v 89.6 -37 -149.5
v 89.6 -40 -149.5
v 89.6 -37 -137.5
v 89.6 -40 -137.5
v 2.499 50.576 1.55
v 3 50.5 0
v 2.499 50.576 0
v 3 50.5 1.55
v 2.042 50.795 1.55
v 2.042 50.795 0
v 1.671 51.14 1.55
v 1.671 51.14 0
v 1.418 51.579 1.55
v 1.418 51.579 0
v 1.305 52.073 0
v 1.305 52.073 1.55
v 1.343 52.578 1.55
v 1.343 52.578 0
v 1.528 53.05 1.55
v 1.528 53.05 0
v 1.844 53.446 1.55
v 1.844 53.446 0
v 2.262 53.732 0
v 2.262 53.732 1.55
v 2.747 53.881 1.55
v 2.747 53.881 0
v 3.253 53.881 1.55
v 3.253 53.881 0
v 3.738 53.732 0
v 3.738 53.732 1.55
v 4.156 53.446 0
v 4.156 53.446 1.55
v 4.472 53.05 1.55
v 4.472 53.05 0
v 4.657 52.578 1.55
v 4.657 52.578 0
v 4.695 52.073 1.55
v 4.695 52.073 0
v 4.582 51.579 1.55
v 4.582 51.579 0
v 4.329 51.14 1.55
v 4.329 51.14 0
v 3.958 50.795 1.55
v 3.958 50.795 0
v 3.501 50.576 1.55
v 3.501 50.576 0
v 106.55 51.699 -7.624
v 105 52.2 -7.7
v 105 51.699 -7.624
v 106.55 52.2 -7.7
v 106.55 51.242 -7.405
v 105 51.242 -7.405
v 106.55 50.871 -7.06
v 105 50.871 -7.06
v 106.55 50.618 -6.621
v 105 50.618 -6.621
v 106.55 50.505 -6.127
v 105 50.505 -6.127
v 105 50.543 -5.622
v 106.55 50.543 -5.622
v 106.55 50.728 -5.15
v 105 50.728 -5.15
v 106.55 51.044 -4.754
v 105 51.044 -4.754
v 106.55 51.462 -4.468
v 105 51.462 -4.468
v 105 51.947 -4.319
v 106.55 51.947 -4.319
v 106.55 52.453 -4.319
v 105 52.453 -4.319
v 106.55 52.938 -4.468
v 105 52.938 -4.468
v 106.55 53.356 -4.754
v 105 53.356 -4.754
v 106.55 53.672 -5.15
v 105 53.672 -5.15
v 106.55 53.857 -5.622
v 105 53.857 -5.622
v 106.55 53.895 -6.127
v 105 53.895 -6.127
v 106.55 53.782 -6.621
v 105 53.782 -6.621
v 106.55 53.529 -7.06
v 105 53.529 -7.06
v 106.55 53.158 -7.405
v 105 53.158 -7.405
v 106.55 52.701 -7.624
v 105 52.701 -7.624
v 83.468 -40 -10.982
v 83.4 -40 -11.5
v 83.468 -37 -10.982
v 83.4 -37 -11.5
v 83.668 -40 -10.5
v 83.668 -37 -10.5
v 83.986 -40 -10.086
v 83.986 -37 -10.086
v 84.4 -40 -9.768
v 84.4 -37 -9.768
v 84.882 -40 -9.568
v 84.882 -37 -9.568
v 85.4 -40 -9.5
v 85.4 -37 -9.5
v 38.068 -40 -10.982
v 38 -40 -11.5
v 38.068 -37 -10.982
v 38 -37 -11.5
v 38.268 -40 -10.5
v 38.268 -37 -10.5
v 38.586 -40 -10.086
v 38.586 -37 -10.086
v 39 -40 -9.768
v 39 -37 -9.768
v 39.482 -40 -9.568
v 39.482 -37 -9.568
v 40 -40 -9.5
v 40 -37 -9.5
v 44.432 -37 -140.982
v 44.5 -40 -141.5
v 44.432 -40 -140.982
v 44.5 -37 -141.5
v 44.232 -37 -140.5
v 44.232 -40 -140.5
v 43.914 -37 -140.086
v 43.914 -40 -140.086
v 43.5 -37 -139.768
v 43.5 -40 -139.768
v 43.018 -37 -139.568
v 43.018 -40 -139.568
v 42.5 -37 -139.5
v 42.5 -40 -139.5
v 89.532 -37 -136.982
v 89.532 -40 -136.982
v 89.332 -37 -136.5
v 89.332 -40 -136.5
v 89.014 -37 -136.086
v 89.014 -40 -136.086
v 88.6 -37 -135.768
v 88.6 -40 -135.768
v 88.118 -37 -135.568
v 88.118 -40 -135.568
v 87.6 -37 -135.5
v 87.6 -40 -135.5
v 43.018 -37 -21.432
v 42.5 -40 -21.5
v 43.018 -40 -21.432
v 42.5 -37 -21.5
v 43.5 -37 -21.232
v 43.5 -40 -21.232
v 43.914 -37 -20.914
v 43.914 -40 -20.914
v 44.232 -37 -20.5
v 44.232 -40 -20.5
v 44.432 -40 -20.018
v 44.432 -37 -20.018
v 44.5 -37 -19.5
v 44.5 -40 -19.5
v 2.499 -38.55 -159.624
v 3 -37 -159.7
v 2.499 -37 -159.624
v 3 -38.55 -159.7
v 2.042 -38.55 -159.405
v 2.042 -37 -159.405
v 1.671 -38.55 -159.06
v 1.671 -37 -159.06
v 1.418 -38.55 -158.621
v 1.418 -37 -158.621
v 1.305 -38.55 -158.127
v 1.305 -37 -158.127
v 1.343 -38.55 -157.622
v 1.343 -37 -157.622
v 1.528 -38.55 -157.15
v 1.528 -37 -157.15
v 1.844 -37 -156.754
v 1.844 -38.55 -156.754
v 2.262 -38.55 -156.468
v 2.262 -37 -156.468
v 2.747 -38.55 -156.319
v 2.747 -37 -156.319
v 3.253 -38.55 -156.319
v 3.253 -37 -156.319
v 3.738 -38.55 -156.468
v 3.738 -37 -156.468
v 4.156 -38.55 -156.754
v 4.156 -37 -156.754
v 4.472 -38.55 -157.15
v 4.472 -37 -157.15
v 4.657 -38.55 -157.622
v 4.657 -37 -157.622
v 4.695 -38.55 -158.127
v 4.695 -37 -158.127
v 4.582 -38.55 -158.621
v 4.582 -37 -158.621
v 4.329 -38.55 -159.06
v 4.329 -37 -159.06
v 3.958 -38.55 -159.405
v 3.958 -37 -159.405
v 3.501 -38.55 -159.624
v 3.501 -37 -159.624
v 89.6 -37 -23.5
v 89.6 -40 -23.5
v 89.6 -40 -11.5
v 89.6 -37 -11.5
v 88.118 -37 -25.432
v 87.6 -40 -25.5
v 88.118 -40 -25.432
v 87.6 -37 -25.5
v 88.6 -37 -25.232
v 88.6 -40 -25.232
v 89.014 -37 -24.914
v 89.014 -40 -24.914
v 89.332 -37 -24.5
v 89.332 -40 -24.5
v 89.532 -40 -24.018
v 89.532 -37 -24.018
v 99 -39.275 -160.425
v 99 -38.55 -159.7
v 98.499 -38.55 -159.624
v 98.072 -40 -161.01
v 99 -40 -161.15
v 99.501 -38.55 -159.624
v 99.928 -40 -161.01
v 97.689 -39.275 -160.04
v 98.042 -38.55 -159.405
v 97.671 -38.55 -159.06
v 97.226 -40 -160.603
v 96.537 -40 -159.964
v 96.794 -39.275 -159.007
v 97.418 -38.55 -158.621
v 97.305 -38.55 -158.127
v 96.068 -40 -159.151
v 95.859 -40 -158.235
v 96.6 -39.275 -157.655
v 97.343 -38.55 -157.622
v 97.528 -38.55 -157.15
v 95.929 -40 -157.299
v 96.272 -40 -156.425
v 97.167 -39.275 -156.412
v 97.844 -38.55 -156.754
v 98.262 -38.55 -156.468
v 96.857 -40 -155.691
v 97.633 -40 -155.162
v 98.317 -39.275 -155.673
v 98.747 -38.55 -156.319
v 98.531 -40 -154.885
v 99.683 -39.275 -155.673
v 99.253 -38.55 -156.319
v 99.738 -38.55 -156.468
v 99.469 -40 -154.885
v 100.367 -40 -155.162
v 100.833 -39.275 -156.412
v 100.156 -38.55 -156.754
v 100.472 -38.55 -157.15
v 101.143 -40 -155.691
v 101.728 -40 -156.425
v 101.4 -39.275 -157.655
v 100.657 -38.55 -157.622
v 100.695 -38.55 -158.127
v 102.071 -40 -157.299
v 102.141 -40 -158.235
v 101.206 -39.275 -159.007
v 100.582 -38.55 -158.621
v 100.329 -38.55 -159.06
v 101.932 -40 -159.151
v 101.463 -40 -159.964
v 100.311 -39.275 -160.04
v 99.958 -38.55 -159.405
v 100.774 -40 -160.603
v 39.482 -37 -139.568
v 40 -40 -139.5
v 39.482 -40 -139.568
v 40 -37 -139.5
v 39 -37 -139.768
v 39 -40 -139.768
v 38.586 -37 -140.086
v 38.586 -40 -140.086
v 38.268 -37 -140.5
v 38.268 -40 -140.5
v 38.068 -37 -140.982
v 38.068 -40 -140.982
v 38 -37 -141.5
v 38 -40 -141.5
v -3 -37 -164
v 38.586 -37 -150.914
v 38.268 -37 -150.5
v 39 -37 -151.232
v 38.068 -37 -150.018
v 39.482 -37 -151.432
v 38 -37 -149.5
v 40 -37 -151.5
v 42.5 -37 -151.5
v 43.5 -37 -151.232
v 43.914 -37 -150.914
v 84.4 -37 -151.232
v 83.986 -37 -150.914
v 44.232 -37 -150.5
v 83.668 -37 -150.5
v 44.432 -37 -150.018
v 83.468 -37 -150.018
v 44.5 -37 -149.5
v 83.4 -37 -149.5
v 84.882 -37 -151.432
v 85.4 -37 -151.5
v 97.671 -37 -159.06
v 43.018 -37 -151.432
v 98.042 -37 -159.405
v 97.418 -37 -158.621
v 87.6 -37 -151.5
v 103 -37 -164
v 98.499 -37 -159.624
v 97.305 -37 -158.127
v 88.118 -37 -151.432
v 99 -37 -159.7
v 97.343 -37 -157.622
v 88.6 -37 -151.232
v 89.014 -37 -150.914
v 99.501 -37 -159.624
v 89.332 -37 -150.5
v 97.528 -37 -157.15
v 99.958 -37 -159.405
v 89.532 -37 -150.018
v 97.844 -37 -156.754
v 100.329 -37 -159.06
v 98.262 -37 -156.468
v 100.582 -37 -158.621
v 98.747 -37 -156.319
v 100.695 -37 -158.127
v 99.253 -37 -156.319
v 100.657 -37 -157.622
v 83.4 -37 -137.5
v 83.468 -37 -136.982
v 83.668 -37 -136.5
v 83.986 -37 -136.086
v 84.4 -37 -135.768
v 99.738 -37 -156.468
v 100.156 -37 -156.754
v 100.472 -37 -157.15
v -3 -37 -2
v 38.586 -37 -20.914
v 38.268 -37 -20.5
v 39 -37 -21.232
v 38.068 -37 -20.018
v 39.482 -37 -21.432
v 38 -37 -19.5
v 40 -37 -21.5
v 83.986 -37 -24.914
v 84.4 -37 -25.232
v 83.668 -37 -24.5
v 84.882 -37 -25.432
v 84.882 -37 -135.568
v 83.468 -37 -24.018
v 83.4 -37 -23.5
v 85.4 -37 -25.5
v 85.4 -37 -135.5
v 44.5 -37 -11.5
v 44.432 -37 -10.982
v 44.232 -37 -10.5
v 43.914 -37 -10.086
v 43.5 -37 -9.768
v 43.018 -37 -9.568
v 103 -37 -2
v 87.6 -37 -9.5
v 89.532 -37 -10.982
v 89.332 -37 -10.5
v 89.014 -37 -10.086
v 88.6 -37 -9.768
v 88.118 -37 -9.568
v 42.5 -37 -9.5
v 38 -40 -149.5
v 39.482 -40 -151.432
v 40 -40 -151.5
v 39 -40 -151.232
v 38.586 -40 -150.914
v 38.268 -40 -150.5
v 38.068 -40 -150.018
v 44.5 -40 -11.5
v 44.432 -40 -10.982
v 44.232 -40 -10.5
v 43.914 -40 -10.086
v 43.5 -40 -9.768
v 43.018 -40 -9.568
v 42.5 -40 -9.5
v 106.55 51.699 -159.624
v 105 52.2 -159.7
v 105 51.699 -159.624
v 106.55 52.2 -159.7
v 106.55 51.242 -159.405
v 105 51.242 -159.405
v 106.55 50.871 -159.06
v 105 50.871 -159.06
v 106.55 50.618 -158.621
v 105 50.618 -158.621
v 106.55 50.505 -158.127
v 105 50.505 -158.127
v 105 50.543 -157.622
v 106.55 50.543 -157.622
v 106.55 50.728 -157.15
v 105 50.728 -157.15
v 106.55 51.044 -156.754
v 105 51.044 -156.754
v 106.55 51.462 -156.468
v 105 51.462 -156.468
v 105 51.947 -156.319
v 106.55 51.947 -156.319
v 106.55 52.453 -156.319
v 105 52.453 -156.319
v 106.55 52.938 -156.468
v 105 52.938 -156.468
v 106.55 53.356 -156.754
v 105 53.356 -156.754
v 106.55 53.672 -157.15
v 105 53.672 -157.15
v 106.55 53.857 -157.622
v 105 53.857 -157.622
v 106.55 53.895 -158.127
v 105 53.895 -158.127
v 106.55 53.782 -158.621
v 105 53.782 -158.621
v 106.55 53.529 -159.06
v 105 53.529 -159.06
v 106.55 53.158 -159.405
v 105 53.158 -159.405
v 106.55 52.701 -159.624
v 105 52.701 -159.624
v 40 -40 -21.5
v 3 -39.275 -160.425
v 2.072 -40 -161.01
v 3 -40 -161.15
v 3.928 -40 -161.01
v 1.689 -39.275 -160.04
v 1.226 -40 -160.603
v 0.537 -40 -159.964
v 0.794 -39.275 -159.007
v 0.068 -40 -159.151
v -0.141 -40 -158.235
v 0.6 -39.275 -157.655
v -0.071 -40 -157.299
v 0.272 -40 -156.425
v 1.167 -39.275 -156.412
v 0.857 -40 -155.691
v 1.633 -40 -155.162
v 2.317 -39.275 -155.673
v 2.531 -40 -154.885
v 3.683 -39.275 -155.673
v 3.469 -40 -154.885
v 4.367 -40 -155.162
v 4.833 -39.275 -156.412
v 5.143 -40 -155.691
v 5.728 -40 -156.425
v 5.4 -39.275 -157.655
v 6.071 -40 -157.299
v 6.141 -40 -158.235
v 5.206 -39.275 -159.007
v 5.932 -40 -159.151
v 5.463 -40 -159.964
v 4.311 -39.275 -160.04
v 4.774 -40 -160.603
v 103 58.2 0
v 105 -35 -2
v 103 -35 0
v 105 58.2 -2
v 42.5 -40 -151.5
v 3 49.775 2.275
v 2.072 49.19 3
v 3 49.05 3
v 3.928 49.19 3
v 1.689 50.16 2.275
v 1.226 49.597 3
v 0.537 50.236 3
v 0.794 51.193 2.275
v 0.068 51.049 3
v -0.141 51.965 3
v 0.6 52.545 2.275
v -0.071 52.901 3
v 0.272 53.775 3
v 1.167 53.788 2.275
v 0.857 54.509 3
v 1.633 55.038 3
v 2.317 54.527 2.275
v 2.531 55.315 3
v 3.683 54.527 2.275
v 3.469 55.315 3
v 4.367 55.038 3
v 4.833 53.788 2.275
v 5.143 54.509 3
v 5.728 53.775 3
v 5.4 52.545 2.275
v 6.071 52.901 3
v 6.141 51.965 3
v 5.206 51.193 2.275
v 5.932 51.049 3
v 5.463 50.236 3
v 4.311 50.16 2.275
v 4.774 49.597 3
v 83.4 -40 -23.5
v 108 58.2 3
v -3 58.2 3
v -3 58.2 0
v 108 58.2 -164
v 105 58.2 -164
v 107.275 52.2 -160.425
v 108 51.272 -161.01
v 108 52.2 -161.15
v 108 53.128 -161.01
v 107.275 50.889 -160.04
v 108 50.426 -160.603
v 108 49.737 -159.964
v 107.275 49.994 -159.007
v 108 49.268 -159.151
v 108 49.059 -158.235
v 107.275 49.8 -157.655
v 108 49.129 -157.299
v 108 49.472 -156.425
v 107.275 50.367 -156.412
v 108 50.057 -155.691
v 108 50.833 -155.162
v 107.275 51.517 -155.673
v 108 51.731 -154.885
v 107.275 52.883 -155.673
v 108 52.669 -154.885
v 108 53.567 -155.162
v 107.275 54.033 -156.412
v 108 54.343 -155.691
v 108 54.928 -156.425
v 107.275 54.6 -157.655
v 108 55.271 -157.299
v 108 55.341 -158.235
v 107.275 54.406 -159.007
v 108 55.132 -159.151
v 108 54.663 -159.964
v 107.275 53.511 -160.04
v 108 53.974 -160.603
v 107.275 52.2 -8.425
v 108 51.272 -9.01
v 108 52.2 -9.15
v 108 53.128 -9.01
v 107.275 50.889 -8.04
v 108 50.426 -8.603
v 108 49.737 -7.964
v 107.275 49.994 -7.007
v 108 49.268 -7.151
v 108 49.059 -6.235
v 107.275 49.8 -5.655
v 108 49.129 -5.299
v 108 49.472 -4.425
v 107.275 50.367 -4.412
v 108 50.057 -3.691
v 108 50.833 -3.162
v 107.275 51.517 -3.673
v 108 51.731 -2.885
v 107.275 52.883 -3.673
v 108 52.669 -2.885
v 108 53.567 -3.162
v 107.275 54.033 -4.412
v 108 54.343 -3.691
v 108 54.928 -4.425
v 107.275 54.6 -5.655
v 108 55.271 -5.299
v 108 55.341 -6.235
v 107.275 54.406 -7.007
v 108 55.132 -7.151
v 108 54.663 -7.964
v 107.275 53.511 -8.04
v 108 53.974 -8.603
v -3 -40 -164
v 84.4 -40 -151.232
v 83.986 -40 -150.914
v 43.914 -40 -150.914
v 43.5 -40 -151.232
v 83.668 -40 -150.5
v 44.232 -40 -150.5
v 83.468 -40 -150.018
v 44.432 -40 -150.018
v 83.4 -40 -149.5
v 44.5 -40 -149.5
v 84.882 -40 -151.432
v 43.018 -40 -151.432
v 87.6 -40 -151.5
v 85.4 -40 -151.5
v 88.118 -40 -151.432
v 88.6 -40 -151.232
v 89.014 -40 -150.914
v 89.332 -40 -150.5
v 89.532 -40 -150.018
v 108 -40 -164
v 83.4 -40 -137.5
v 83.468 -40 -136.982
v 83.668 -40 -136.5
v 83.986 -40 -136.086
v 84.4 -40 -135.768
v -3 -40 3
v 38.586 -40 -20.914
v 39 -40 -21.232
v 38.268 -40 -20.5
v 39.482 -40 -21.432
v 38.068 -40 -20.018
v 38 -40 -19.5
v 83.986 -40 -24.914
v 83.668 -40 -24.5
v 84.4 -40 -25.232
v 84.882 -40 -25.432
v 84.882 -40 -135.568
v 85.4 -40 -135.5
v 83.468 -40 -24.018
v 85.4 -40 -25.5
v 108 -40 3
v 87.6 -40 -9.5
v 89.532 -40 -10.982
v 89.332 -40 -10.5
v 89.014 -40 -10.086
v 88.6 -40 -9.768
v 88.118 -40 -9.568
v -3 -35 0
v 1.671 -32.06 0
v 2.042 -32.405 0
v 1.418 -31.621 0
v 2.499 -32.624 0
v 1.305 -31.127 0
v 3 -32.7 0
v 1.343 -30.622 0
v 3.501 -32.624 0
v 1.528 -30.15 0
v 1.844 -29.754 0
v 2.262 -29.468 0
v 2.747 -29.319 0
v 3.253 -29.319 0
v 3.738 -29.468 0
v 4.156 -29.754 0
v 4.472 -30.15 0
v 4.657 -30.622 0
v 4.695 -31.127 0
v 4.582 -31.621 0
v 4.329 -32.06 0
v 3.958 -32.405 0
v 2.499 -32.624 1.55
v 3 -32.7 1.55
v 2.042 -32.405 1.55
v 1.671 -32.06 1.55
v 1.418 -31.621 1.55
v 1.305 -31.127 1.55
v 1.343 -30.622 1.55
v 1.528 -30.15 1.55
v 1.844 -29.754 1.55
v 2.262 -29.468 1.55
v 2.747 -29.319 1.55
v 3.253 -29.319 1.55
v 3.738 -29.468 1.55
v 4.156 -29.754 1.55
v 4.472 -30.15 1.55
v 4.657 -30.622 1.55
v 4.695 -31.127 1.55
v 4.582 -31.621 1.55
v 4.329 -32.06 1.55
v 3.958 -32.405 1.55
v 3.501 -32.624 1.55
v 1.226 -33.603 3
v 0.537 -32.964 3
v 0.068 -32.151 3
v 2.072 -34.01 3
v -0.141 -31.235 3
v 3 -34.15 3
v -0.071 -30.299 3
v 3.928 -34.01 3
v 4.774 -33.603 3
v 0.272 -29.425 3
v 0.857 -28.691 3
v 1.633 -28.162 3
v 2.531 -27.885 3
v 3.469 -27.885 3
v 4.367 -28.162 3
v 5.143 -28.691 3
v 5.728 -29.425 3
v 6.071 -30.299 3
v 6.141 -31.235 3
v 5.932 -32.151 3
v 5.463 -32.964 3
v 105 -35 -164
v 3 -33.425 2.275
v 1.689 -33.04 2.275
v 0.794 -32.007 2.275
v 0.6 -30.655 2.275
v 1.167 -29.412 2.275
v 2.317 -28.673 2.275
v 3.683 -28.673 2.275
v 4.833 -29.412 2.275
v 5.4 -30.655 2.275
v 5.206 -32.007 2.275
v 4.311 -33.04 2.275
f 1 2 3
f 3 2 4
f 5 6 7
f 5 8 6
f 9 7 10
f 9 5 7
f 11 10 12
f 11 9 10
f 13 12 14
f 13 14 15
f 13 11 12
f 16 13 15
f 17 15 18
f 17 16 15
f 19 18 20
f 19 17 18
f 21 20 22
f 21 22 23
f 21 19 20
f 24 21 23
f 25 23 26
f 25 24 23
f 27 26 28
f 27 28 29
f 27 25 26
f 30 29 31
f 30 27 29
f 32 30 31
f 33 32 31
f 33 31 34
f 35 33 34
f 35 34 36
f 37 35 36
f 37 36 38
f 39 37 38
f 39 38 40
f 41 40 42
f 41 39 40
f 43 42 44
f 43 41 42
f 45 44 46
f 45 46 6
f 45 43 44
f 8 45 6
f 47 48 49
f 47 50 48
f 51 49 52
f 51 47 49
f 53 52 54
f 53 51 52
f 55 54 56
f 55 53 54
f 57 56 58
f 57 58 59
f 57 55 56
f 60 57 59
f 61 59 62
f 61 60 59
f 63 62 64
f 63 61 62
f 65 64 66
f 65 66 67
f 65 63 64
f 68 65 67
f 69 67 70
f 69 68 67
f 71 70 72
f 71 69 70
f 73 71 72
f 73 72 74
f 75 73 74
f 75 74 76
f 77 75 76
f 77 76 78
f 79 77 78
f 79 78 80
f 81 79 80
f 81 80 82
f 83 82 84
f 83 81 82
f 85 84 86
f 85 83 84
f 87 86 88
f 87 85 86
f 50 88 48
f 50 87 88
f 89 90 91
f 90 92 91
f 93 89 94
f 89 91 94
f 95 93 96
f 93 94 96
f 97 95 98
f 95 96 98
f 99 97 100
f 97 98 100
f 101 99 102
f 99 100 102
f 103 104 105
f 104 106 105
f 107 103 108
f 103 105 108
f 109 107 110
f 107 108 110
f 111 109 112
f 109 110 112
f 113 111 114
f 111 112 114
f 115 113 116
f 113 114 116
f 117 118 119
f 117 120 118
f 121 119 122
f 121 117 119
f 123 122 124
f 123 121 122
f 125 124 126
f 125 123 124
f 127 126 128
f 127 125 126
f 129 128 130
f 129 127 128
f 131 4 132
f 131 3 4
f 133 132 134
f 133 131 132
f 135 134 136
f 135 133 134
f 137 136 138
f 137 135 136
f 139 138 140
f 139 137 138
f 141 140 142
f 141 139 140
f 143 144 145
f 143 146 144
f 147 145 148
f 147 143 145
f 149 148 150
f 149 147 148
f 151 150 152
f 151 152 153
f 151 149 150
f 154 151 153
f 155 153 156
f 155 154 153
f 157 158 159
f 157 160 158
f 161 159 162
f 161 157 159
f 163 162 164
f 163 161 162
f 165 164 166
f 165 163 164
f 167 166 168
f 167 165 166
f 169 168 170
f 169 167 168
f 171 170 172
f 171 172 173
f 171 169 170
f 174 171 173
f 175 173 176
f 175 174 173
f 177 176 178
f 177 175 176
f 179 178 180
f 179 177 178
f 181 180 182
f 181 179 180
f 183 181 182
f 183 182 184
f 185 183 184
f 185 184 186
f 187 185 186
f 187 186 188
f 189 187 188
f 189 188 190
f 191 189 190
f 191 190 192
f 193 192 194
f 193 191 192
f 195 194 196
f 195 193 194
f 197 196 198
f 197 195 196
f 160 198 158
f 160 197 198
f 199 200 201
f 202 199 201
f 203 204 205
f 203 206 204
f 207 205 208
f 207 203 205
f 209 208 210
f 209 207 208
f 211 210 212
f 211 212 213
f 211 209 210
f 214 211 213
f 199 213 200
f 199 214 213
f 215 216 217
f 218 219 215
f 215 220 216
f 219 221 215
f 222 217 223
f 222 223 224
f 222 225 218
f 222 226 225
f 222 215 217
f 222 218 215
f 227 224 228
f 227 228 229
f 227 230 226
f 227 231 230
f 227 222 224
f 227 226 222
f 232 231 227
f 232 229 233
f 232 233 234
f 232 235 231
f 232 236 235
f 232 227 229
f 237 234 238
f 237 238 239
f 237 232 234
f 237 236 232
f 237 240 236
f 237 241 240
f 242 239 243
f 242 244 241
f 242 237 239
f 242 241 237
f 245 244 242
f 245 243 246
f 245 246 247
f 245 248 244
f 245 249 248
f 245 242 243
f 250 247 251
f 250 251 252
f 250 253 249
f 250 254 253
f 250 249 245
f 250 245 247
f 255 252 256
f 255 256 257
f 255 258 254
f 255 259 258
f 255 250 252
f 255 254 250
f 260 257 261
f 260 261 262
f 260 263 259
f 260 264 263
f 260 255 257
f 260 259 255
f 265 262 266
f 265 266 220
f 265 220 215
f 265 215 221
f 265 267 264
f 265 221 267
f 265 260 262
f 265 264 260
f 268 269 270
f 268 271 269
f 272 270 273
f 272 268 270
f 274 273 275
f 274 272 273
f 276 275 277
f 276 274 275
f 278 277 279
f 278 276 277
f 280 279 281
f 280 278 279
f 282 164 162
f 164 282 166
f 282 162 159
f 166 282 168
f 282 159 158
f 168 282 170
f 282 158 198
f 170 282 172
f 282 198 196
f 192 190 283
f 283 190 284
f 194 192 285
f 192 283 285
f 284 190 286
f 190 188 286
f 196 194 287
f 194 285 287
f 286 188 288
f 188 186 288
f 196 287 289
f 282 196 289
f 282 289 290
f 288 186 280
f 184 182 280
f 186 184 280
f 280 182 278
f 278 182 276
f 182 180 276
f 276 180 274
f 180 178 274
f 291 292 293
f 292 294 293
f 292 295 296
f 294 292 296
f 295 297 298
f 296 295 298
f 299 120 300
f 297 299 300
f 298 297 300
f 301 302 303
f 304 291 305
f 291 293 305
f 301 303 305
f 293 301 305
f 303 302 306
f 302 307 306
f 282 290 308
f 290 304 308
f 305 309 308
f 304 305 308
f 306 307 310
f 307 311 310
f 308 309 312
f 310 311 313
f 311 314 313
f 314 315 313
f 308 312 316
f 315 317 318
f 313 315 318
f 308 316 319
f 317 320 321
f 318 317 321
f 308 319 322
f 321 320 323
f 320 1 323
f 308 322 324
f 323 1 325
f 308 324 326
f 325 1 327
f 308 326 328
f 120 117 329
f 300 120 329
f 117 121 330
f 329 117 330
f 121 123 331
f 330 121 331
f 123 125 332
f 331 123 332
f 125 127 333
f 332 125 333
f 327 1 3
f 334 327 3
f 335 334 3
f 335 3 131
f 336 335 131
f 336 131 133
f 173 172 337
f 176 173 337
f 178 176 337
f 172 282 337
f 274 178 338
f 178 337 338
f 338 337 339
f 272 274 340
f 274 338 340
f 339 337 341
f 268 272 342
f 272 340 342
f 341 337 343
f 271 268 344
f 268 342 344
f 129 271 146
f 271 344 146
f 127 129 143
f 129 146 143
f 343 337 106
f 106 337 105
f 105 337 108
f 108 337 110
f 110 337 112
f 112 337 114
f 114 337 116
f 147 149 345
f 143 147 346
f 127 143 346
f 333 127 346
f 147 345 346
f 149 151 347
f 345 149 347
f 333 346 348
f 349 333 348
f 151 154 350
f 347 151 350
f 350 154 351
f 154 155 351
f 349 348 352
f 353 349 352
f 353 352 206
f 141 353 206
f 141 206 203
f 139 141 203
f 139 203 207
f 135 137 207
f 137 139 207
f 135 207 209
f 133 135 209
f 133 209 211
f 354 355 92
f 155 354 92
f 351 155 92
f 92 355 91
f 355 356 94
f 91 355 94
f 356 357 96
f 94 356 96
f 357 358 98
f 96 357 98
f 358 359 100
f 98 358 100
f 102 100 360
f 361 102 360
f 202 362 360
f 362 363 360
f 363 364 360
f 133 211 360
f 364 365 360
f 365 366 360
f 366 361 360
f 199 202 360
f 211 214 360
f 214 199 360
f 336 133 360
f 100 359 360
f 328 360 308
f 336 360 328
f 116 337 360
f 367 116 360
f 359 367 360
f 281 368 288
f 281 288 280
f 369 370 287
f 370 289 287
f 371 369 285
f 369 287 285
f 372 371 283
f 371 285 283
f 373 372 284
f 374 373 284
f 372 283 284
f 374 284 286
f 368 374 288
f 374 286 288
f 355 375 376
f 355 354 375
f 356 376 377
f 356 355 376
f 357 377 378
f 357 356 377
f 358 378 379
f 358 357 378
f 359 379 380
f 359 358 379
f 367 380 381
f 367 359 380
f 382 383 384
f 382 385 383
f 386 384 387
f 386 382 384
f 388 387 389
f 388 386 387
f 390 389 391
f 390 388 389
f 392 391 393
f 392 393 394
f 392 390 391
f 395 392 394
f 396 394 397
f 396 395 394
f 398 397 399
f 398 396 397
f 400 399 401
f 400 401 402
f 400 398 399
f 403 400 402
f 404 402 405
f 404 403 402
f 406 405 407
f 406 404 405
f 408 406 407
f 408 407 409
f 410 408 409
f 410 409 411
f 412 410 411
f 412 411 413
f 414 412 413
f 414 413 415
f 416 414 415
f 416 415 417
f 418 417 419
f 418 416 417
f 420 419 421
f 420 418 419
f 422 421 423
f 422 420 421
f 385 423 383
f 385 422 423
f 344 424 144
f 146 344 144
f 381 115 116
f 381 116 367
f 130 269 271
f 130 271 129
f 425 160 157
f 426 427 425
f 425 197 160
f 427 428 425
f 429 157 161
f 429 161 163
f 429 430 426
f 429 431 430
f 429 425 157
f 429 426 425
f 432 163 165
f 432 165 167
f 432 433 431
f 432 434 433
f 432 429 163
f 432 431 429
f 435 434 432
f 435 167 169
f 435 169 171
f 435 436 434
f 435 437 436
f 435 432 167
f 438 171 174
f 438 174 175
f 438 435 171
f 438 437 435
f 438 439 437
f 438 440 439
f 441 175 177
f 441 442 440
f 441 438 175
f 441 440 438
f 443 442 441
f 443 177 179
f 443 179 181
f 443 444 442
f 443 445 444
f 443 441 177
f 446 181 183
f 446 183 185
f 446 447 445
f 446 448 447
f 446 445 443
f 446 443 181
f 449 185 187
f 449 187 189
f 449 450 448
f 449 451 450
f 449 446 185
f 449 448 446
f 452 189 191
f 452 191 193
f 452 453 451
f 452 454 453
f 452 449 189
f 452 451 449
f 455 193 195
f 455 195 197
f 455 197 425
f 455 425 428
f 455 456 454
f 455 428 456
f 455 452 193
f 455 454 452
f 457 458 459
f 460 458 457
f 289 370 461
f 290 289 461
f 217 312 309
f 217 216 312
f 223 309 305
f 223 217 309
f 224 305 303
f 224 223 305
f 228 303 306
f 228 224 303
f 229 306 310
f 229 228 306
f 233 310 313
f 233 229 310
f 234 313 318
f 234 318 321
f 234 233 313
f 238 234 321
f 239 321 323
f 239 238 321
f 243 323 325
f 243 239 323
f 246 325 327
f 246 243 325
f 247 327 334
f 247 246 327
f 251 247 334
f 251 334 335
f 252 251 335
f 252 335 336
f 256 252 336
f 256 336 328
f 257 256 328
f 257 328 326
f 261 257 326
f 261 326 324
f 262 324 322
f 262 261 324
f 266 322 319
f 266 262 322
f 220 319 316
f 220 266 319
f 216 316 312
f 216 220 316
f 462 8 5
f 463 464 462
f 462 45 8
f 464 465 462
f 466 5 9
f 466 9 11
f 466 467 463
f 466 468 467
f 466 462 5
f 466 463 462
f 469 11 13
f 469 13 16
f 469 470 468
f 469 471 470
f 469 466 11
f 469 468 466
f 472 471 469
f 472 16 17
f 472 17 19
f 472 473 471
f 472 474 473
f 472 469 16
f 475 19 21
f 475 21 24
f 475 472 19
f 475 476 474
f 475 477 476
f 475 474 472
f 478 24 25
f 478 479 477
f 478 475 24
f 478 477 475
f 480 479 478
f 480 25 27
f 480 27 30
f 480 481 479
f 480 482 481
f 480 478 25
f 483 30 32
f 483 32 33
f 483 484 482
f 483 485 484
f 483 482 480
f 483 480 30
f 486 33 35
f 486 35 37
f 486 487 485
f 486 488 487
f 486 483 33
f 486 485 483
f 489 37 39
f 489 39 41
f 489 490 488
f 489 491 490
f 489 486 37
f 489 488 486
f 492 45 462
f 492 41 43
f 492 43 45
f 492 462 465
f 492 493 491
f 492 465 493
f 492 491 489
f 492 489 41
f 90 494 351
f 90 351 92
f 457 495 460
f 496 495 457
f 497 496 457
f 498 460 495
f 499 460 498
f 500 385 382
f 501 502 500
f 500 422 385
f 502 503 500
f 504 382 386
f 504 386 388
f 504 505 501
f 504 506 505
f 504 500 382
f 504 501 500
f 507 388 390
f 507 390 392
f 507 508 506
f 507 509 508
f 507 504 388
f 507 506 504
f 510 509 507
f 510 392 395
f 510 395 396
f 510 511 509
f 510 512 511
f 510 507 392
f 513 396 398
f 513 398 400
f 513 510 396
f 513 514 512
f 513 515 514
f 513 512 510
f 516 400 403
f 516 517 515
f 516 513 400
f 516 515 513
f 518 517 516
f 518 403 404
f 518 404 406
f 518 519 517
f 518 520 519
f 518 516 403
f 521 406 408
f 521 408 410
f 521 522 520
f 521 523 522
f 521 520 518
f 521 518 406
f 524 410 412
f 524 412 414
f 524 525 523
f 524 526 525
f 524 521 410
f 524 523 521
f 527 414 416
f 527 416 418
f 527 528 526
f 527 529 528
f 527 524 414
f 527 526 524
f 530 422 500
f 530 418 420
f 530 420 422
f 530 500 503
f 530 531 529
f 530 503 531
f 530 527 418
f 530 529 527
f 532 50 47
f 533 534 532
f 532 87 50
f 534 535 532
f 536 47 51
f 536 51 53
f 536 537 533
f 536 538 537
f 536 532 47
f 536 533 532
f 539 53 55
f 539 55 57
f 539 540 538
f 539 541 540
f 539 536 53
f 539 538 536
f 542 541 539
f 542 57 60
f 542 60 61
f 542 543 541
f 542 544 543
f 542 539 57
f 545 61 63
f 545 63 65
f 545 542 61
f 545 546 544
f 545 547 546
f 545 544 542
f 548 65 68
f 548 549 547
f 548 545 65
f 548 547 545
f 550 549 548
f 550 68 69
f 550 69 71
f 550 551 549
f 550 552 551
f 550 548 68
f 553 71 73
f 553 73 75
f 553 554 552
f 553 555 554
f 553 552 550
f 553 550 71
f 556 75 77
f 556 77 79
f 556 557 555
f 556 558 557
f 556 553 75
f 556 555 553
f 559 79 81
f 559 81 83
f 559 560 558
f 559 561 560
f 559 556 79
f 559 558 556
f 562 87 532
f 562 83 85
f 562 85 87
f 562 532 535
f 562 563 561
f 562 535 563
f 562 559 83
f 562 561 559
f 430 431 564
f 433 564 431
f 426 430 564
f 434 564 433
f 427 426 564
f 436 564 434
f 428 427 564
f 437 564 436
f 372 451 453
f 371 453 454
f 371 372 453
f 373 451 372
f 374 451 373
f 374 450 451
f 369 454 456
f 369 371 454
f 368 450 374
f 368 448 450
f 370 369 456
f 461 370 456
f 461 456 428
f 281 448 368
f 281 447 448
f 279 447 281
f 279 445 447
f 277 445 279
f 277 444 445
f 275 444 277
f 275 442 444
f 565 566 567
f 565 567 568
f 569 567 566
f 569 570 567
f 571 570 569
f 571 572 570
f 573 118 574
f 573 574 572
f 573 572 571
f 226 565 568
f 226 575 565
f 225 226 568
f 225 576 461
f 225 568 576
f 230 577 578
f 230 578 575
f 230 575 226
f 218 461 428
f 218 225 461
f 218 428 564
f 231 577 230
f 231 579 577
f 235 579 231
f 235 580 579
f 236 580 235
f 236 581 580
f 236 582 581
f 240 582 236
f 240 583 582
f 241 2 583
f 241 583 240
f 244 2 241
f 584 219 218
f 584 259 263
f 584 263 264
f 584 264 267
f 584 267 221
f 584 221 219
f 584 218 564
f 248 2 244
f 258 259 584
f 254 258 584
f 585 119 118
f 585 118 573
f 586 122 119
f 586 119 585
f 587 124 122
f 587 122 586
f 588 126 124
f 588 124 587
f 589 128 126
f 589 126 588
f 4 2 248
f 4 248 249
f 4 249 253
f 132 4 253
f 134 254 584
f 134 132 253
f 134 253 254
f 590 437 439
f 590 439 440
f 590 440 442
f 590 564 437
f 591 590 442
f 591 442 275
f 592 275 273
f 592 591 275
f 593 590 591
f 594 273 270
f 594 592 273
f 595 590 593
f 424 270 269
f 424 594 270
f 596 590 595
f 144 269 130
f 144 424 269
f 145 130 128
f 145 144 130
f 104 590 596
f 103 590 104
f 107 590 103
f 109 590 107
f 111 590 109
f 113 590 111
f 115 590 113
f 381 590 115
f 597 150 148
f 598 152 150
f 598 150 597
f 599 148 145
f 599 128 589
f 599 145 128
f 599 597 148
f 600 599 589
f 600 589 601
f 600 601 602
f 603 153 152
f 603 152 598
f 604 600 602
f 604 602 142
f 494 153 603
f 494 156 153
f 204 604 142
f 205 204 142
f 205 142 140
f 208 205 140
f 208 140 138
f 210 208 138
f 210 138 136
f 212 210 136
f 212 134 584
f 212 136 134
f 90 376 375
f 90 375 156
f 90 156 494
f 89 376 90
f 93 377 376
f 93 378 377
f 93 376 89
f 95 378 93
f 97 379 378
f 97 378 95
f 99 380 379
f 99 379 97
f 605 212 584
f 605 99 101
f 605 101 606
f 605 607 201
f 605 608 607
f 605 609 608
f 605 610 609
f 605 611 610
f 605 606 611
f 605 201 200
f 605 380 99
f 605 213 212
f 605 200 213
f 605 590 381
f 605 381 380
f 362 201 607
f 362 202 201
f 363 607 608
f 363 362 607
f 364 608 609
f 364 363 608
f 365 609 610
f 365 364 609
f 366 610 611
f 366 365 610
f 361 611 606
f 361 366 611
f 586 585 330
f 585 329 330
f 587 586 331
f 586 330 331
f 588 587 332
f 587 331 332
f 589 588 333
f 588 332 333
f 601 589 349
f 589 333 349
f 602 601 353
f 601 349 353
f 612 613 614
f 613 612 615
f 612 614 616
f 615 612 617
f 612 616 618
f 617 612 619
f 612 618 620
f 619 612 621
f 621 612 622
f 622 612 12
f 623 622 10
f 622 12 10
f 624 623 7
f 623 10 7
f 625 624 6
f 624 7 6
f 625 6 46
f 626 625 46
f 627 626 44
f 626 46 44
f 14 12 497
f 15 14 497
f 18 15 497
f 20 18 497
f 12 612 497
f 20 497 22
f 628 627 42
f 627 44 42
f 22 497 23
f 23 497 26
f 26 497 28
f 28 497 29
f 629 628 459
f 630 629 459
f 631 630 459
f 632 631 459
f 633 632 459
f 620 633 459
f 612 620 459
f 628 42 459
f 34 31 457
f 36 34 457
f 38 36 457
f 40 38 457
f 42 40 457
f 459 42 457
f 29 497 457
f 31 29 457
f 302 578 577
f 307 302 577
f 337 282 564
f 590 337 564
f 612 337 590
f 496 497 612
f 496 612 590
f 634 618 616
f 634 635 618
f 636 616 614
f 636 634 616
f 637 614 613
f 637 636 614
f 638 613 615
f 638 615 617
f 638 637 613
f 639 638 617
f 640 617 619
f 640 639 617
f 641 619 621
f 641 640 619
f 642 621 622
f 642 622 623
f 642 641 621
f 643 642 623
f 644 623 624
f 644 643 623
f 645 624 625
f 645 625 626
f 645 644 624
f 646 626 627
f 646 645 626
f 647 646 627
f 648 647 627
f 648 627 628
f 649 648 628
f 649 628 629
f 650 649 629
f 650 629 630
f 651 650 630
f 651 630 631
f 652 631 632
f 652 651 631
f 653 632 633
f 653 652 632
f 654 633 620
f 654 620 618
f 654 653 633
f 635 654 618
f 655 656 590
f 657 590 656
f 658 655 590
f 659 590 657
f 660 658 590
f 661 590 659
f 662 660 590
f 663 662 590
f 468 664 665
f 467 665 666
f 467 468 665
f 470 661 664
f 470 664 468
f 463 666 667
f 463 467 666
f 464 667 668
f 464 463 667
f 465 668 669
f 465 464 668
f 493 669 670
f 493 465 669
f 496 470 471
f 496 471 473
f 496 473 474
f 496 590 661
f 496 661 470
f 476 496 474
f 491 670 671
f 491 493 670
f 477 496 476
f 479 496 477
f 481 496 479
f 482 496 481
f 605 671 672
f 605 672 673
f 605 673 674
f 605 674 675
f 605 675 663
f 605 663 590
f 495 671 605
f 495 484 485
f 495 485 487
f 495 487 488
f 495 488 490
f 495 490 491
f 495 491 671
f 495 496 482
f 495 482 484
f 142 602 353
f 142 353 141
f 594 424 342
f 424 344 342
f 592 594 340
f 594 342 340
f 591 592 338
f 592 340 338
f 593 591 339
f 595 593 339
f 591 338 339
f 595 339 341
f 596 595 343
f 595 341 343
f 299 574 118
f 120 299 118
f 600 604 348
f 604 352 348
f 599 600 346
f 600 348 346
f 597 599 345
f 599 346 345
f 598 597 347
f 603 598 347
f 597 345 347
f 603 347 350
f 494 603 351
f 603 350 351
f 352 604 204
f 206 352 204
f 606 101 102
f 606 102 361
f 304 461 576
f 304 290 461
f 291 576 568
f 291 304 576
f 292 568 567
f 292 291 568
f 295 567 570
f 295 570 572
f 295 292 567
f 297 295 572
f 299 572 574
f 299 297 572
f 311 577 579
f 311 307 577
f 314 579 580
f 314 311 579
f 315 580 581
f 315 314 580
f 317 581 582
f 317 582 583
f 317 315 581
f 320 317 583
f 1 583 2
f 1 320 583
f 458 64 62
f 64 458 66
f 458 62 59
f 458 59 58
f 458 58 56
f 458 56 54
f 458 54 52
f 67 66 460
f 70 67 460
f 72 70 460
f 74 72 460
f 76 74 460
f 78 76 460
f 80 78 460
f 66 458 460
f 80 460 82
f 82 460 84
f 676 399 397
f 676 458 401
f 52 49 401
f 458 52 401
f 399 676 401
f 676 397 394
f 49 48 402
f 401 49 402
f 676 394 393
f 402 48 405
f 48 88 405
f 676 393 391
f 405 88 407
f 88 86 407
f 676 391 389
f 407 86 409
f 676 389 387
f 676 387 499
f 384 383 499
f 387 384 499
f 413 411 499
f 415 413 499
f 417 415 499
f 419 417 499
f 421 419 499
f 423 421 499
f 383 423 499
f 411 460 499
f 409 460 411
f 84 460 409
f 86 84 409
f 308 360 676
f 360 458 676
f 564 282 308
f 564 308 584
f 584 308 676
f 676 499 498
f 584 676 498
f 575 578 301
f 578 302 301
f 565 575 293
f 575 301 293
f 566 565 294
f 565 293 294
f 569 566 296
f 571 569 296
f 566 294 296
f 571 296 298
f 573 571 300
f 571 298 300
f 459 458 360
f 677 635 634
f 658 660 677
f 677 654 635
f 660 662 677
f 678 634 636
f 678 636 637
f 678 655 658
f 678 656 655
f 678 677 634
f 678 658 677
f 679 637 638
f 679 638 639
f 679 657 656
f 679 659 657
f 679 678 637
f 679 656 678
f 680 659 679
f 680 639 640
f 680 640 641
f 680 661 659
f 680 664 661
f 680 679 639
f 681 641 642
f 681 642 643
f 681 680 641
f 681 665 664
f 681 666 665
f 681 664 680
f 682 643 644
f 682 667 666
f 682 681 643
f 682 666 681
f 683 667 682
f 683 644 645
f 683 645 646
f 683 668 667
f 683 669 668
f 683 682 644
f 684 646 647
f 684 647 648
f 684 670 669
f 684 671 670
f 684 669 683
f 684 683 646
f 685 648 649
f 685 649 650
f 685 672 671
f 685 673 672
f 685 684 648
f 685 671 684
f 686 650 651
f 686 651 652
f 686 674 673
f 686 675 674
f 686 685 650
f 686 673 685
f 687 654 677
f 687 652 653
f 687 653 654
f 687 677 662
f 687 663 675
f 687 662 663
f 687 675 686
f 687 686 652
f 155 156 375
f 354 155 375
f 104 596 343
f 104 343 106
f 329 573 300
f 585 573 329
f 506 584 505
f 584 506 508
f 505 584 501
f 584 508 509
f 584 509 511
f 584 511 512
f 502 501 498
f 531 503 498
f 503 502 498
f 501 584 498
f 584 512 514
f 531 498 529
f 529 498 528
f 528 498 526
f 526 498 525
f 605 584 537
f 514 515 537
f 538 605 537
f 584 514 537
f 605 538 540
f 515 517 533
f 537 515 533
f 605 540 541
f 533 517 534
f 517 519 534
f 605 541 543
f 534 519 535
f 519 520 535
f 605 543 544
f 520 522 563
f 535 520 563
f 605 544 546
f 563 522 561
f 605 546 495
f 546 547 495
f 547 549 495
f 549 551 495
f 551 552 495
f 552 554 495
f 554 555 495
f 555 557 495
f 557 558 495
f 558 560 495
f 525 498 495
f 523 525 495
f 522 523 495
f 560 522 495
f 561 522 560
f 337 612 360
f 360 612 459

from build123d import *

# Parameters (mm, degrees)
SKETCH2_W                                      = 108
SKETCH2_H                                      = 95.2
BOSS_EXTRUDE1_DEPTH                            = 3
SKETCH3_W                                      = 167
SKETCH3_H                                      = 95.2
BOSS_EXTRUDE2_DEPTH                            = 3
SKETCH4_W                                      = 111
SKETCH4_H                                      = 167
BOSS_EXTRUDE3_DEPTH                            = 3
CSK_FOR_M3_FLAT_HEAD_MACHINE_SCREW1_AT_2_COUNT = 2
CSK_FOR_M3_FLAT_HEAD_MACHINE_SCREW1_AT_2_PITCH = 83.2
CSK_FOR_M3_FLAT_HEAD_MACHINE_SCREW2_AT_2_COUNT = 2
CSK_FOR_M3_FLAT_HEAD_MACHINE_SCREW2_AT_2_PITCH = 96
CSK_FOR_M3_FLAT_HEAD_MACHINE_SCREW3_AT_2_COUNT = 2
CSK_FOR_M3_FLAT_HEAD_MACHINE_SCREW3_AT_2_PITCH = 152
CUT_EXTRUDE1_REACH                             = 221.552
SKETCH12_W                                     = 6.5
SKETCH12_H                                     = 12
SKETCH12_W_2                                   = 6.2
SKETCH12_H_2                                   = 16
FILLET1_R                                      = 2
CHAMFER1_SIZE                                  = 2


with BuildPart() as part:
    # Sketch2 → Boss-Extrude1 (new body)
    with BuildSketch(Plane.XY):
        with Locations((51, 10.6)):
            Rectangle(SKETCH2_W, SKETCH2_H)
    extrude(amount=BOSS_EXTRUDE1_DEPTH)

    # Sketch3 → Boss-Extrude2 (add)
    with BuildSketch(Plane(origin=(105, 0, 0), x_dir=(0, 0, -1), z_dir=(1, 0, 0))):
        with Locations((80.5, 10.6)):
            Rectangle(SKETCH3_W, SKETCH3_H)
    extrude(amount=BOSS_EXTRUDE2_DEPTH)

    # Sketch4 → Boss-Extrude3 (add)
    with BuildSketch(Plane.XZ.offset(37)):
        with Locations((52.5, -80.5)):
            Rectangle(SKETCH4_W, SKETCH4_H)
    extrude(amount=BOSS_EXTRUDE3_DEPTH)

    # Sketch6 → CSK for M3 Flat Head Machine Screw1 (revolve, cut)
    with BuildSketch(Plane(origin=(3, -31, 3), x_dir=(0, -1, 0), z_dir=(1, 0, 0))):
        Polygon((0, 0), (0, 3), (1.7, 3), (1.7, 1.45), (3.15, 0), align=None)
    csk_for_m3_flat_head_machine_screw1 = revolve(axis=Axis((3, -31, 9.35), (0, 0, -1)), mode=Mode.SUBTRACT)

    # CSK for M3 Flat Head Machine Screw1 at 2: CSK for M3 Flat Head Machine Screw1 ×2
    with Locations(*[(0, i * CSK_FOR_M3_FLAT_HEAD_MACHINE_SCREW1_AT_2_PITCH, 0) for i in range(1, CSK_FOR_M3_FLAT_HEAD_MACHINE_SCREW1_AT_2_COUNT)]):
        add(csk_for_m3_flat_head_machine_screw1, mode=Mode.SUBTRACT)

    # Sketch8 → CSK for M3 Flat Head Machine Screw2 (revolve, cut)
    with BuildSketch(Plane(origin=(3, -40, -158), x_dir=(0, 0, -1), z_dir=(1, 0, 0))):
        Polygon((0, 0), (0, 3), (1.7, 3), (1.7, 1.45), (3.15, 0), align=None)
    csk_for_m3_flat_head_machine_screw2 = revolve(axis=Axis((3, -46.35, -158), (0, 1, 0)), mode=Mode.SUBTRACT)

    # CSK for M3 Flat Head Machine Screw2 at 2: CSK for M3 Flat Head Machine Screw2 ×2
    with Locations(*[(i * CSK_FOR_M3_FLAT_HEAD_MACHINE_SCREW2_AT_2_PITCH, 0, 0) for i in range(1, CSK_FOR_M3_FLAT_HEAD_MACHINE_SCREW2_AT_2_COUNT)]):
        add(csk_for_m3_flat_head_machine_screw2, mode=Mode.SUBTRACT)

    # Sketch10 → CSK for M3 Flat Head Machine Screw3 (revolve, cut)
    with BuildSketch(Plane(origin=(108, 52.2, -6), x_dir=(0, 0, -1), z_dir=(0, 1, 0))):
        Polygon((0, 0), (0, 3), (1.7, 3), (1.7, 1.45), (3.15, 0), align=None)
    csk_for_m3_flat_head_machine_screw3 = revolve(axis=Axis((114.35, 52.2, -6), (-1, 0, 0)), mode=Mode.SUBTRACT)

    # CSK for M3 Flat Head Machine Screw3 at 2: CSK for M3 Flat Head Machine Screw3 ×2
    with Locations(*[(0, 0, -i * CSK_FOR_M3_FLAT_HEAD_MACHINE_SCREW3_AT_2_PITCH) for i in range(1, CSK_FOR_M3_FLAT_HEAD_MACHINE_SCREW3_AT_2_COUNT)]):
        add(csk_for_m3_flat_head_machine_screw3, mode=Mode.SUBTRACT)

    # Sketch12 → Cut-Extrude1 (cut, up to next)
    with BuildSketch(Plane.XZ.offset(40), mode=Mode.PRIVATE) as cut_extrude1_sk1:
        with Locations((41.25, -15.5)):
            Rectangle(SKETCH12_W, SKETCH12_H)
    cut_extrude1_tool1 = extrude(cut_extrude1_sk1.sketch, amount=-CUT_EXTRUDE1_REACH, mode=Mode.PRIVATE) & part.part
    # Sketch12 → Cut-Extrude1 (cut, up to next)
    with BuildSketch(Plane.XZ.offset(40), mode=Mode.PRIVATE) as cut_extrude1_sk2:
        with Locations((86.5, -17.5)):
            Rectangle(SKETCH12_W_2, SKETCH12_H_2)
    cut_extrude1_tool2 = extrude(cut_extrude1_sk2.sketch, amount=-CUT_EXTRUDE1_REACH, mode=Mode.PRIVATE) & part.part
    # Sketch12 → Cut-Extrude1 (cut, up to next)
    with BuildSketch(Plane.XZ.offset(40), mode=Mode.PRIVATE) as cut_extrude1_sk3:
        with Locations((86.5, -143.5)):
            Rectangle(SKETCH12_W_2, SKETCH12_H_2)
    cut_extrude1_tool3 = extrude(cut_extrude1_sk3.sketch, amount=-CUT_EXTRUDE1_REACH, mode=Mode.PRIVATE) & part.part
    # Sketch12 → Cut-Extrude1 (cut, up to next)
    with BuildSketch(Plane.XZ.offset(40), mode=Mode.PRIVATE) as cut_extrude1_sk4:
        with Locations((41.25, -145.5)):
            Rectangle(SKETCH12_W, SKETCH12_H)
    cut_extrude1_tool4 = extrude(cut_extrude1_sk4.sketch, amount=-CUT_EXTRUDE1_REACH, mode=Mode.PRIVATE) & part.part
    add(cut_extrude1_tool1.solids().sort_by_distance((41.25, -40, -15.5))[0], mode=Mode.SUBTRACT)
    add(cut_extrude1_tool2.solids().sort_by_distance((86.5, -40, -17.5))[0], mode=Mode.SUBTRACT)
    add(cut_extrude1_tool3.solids().sort_by_distance((86.5, -40, -143.5))[0], mode=Mode.SUBTRACT)
    add(cut_extrude1_tool4.solids().sort_by_distance((41.25, -40, -145.5))[0], mode=Mode.SUBTRACT)

    # Fillet1
    fillet1_edges = [part.edges().sort_by_distance(p)[0] for p in [
        (44.5, -38.5, -139.5),
        (44.5, -38.5, -151.5),
        (38, -38.5, -151.5),
        (38, -38.5, -139.5),
        (89.6, -38.5, -135.5),
        (89.6, -38.5, -151.5),
        (83.4, -38.5, -151.5),
        (83.4, -38.5, -135.5),
        (83.4, -38.5, -9.5),
        (89.6, -38.5, -9.5),
        (89.6, -38.5, -25.5),
        (83.4, -38.5, -25.5),
        (38, -38.5, -9.5),
        (44.5, -38.5, -9.5),
        (44.5, -38.5, -21.5),
        (38, -38.5, -21.5),
    ]]
    fillet(fillet1_edges, radius=FILLET1_R)

    # Chamfer1
    chamfer1_edges = [part.edges().sort_by_distance(p)[0] for p in [
        (105, -37, -82),
        (105, 10.6, 0),
        (51, -37, 0),
    ]]
    chamfer(chamfer1_edges, length=CHAMFER1_SIZE)


solid = part.part
